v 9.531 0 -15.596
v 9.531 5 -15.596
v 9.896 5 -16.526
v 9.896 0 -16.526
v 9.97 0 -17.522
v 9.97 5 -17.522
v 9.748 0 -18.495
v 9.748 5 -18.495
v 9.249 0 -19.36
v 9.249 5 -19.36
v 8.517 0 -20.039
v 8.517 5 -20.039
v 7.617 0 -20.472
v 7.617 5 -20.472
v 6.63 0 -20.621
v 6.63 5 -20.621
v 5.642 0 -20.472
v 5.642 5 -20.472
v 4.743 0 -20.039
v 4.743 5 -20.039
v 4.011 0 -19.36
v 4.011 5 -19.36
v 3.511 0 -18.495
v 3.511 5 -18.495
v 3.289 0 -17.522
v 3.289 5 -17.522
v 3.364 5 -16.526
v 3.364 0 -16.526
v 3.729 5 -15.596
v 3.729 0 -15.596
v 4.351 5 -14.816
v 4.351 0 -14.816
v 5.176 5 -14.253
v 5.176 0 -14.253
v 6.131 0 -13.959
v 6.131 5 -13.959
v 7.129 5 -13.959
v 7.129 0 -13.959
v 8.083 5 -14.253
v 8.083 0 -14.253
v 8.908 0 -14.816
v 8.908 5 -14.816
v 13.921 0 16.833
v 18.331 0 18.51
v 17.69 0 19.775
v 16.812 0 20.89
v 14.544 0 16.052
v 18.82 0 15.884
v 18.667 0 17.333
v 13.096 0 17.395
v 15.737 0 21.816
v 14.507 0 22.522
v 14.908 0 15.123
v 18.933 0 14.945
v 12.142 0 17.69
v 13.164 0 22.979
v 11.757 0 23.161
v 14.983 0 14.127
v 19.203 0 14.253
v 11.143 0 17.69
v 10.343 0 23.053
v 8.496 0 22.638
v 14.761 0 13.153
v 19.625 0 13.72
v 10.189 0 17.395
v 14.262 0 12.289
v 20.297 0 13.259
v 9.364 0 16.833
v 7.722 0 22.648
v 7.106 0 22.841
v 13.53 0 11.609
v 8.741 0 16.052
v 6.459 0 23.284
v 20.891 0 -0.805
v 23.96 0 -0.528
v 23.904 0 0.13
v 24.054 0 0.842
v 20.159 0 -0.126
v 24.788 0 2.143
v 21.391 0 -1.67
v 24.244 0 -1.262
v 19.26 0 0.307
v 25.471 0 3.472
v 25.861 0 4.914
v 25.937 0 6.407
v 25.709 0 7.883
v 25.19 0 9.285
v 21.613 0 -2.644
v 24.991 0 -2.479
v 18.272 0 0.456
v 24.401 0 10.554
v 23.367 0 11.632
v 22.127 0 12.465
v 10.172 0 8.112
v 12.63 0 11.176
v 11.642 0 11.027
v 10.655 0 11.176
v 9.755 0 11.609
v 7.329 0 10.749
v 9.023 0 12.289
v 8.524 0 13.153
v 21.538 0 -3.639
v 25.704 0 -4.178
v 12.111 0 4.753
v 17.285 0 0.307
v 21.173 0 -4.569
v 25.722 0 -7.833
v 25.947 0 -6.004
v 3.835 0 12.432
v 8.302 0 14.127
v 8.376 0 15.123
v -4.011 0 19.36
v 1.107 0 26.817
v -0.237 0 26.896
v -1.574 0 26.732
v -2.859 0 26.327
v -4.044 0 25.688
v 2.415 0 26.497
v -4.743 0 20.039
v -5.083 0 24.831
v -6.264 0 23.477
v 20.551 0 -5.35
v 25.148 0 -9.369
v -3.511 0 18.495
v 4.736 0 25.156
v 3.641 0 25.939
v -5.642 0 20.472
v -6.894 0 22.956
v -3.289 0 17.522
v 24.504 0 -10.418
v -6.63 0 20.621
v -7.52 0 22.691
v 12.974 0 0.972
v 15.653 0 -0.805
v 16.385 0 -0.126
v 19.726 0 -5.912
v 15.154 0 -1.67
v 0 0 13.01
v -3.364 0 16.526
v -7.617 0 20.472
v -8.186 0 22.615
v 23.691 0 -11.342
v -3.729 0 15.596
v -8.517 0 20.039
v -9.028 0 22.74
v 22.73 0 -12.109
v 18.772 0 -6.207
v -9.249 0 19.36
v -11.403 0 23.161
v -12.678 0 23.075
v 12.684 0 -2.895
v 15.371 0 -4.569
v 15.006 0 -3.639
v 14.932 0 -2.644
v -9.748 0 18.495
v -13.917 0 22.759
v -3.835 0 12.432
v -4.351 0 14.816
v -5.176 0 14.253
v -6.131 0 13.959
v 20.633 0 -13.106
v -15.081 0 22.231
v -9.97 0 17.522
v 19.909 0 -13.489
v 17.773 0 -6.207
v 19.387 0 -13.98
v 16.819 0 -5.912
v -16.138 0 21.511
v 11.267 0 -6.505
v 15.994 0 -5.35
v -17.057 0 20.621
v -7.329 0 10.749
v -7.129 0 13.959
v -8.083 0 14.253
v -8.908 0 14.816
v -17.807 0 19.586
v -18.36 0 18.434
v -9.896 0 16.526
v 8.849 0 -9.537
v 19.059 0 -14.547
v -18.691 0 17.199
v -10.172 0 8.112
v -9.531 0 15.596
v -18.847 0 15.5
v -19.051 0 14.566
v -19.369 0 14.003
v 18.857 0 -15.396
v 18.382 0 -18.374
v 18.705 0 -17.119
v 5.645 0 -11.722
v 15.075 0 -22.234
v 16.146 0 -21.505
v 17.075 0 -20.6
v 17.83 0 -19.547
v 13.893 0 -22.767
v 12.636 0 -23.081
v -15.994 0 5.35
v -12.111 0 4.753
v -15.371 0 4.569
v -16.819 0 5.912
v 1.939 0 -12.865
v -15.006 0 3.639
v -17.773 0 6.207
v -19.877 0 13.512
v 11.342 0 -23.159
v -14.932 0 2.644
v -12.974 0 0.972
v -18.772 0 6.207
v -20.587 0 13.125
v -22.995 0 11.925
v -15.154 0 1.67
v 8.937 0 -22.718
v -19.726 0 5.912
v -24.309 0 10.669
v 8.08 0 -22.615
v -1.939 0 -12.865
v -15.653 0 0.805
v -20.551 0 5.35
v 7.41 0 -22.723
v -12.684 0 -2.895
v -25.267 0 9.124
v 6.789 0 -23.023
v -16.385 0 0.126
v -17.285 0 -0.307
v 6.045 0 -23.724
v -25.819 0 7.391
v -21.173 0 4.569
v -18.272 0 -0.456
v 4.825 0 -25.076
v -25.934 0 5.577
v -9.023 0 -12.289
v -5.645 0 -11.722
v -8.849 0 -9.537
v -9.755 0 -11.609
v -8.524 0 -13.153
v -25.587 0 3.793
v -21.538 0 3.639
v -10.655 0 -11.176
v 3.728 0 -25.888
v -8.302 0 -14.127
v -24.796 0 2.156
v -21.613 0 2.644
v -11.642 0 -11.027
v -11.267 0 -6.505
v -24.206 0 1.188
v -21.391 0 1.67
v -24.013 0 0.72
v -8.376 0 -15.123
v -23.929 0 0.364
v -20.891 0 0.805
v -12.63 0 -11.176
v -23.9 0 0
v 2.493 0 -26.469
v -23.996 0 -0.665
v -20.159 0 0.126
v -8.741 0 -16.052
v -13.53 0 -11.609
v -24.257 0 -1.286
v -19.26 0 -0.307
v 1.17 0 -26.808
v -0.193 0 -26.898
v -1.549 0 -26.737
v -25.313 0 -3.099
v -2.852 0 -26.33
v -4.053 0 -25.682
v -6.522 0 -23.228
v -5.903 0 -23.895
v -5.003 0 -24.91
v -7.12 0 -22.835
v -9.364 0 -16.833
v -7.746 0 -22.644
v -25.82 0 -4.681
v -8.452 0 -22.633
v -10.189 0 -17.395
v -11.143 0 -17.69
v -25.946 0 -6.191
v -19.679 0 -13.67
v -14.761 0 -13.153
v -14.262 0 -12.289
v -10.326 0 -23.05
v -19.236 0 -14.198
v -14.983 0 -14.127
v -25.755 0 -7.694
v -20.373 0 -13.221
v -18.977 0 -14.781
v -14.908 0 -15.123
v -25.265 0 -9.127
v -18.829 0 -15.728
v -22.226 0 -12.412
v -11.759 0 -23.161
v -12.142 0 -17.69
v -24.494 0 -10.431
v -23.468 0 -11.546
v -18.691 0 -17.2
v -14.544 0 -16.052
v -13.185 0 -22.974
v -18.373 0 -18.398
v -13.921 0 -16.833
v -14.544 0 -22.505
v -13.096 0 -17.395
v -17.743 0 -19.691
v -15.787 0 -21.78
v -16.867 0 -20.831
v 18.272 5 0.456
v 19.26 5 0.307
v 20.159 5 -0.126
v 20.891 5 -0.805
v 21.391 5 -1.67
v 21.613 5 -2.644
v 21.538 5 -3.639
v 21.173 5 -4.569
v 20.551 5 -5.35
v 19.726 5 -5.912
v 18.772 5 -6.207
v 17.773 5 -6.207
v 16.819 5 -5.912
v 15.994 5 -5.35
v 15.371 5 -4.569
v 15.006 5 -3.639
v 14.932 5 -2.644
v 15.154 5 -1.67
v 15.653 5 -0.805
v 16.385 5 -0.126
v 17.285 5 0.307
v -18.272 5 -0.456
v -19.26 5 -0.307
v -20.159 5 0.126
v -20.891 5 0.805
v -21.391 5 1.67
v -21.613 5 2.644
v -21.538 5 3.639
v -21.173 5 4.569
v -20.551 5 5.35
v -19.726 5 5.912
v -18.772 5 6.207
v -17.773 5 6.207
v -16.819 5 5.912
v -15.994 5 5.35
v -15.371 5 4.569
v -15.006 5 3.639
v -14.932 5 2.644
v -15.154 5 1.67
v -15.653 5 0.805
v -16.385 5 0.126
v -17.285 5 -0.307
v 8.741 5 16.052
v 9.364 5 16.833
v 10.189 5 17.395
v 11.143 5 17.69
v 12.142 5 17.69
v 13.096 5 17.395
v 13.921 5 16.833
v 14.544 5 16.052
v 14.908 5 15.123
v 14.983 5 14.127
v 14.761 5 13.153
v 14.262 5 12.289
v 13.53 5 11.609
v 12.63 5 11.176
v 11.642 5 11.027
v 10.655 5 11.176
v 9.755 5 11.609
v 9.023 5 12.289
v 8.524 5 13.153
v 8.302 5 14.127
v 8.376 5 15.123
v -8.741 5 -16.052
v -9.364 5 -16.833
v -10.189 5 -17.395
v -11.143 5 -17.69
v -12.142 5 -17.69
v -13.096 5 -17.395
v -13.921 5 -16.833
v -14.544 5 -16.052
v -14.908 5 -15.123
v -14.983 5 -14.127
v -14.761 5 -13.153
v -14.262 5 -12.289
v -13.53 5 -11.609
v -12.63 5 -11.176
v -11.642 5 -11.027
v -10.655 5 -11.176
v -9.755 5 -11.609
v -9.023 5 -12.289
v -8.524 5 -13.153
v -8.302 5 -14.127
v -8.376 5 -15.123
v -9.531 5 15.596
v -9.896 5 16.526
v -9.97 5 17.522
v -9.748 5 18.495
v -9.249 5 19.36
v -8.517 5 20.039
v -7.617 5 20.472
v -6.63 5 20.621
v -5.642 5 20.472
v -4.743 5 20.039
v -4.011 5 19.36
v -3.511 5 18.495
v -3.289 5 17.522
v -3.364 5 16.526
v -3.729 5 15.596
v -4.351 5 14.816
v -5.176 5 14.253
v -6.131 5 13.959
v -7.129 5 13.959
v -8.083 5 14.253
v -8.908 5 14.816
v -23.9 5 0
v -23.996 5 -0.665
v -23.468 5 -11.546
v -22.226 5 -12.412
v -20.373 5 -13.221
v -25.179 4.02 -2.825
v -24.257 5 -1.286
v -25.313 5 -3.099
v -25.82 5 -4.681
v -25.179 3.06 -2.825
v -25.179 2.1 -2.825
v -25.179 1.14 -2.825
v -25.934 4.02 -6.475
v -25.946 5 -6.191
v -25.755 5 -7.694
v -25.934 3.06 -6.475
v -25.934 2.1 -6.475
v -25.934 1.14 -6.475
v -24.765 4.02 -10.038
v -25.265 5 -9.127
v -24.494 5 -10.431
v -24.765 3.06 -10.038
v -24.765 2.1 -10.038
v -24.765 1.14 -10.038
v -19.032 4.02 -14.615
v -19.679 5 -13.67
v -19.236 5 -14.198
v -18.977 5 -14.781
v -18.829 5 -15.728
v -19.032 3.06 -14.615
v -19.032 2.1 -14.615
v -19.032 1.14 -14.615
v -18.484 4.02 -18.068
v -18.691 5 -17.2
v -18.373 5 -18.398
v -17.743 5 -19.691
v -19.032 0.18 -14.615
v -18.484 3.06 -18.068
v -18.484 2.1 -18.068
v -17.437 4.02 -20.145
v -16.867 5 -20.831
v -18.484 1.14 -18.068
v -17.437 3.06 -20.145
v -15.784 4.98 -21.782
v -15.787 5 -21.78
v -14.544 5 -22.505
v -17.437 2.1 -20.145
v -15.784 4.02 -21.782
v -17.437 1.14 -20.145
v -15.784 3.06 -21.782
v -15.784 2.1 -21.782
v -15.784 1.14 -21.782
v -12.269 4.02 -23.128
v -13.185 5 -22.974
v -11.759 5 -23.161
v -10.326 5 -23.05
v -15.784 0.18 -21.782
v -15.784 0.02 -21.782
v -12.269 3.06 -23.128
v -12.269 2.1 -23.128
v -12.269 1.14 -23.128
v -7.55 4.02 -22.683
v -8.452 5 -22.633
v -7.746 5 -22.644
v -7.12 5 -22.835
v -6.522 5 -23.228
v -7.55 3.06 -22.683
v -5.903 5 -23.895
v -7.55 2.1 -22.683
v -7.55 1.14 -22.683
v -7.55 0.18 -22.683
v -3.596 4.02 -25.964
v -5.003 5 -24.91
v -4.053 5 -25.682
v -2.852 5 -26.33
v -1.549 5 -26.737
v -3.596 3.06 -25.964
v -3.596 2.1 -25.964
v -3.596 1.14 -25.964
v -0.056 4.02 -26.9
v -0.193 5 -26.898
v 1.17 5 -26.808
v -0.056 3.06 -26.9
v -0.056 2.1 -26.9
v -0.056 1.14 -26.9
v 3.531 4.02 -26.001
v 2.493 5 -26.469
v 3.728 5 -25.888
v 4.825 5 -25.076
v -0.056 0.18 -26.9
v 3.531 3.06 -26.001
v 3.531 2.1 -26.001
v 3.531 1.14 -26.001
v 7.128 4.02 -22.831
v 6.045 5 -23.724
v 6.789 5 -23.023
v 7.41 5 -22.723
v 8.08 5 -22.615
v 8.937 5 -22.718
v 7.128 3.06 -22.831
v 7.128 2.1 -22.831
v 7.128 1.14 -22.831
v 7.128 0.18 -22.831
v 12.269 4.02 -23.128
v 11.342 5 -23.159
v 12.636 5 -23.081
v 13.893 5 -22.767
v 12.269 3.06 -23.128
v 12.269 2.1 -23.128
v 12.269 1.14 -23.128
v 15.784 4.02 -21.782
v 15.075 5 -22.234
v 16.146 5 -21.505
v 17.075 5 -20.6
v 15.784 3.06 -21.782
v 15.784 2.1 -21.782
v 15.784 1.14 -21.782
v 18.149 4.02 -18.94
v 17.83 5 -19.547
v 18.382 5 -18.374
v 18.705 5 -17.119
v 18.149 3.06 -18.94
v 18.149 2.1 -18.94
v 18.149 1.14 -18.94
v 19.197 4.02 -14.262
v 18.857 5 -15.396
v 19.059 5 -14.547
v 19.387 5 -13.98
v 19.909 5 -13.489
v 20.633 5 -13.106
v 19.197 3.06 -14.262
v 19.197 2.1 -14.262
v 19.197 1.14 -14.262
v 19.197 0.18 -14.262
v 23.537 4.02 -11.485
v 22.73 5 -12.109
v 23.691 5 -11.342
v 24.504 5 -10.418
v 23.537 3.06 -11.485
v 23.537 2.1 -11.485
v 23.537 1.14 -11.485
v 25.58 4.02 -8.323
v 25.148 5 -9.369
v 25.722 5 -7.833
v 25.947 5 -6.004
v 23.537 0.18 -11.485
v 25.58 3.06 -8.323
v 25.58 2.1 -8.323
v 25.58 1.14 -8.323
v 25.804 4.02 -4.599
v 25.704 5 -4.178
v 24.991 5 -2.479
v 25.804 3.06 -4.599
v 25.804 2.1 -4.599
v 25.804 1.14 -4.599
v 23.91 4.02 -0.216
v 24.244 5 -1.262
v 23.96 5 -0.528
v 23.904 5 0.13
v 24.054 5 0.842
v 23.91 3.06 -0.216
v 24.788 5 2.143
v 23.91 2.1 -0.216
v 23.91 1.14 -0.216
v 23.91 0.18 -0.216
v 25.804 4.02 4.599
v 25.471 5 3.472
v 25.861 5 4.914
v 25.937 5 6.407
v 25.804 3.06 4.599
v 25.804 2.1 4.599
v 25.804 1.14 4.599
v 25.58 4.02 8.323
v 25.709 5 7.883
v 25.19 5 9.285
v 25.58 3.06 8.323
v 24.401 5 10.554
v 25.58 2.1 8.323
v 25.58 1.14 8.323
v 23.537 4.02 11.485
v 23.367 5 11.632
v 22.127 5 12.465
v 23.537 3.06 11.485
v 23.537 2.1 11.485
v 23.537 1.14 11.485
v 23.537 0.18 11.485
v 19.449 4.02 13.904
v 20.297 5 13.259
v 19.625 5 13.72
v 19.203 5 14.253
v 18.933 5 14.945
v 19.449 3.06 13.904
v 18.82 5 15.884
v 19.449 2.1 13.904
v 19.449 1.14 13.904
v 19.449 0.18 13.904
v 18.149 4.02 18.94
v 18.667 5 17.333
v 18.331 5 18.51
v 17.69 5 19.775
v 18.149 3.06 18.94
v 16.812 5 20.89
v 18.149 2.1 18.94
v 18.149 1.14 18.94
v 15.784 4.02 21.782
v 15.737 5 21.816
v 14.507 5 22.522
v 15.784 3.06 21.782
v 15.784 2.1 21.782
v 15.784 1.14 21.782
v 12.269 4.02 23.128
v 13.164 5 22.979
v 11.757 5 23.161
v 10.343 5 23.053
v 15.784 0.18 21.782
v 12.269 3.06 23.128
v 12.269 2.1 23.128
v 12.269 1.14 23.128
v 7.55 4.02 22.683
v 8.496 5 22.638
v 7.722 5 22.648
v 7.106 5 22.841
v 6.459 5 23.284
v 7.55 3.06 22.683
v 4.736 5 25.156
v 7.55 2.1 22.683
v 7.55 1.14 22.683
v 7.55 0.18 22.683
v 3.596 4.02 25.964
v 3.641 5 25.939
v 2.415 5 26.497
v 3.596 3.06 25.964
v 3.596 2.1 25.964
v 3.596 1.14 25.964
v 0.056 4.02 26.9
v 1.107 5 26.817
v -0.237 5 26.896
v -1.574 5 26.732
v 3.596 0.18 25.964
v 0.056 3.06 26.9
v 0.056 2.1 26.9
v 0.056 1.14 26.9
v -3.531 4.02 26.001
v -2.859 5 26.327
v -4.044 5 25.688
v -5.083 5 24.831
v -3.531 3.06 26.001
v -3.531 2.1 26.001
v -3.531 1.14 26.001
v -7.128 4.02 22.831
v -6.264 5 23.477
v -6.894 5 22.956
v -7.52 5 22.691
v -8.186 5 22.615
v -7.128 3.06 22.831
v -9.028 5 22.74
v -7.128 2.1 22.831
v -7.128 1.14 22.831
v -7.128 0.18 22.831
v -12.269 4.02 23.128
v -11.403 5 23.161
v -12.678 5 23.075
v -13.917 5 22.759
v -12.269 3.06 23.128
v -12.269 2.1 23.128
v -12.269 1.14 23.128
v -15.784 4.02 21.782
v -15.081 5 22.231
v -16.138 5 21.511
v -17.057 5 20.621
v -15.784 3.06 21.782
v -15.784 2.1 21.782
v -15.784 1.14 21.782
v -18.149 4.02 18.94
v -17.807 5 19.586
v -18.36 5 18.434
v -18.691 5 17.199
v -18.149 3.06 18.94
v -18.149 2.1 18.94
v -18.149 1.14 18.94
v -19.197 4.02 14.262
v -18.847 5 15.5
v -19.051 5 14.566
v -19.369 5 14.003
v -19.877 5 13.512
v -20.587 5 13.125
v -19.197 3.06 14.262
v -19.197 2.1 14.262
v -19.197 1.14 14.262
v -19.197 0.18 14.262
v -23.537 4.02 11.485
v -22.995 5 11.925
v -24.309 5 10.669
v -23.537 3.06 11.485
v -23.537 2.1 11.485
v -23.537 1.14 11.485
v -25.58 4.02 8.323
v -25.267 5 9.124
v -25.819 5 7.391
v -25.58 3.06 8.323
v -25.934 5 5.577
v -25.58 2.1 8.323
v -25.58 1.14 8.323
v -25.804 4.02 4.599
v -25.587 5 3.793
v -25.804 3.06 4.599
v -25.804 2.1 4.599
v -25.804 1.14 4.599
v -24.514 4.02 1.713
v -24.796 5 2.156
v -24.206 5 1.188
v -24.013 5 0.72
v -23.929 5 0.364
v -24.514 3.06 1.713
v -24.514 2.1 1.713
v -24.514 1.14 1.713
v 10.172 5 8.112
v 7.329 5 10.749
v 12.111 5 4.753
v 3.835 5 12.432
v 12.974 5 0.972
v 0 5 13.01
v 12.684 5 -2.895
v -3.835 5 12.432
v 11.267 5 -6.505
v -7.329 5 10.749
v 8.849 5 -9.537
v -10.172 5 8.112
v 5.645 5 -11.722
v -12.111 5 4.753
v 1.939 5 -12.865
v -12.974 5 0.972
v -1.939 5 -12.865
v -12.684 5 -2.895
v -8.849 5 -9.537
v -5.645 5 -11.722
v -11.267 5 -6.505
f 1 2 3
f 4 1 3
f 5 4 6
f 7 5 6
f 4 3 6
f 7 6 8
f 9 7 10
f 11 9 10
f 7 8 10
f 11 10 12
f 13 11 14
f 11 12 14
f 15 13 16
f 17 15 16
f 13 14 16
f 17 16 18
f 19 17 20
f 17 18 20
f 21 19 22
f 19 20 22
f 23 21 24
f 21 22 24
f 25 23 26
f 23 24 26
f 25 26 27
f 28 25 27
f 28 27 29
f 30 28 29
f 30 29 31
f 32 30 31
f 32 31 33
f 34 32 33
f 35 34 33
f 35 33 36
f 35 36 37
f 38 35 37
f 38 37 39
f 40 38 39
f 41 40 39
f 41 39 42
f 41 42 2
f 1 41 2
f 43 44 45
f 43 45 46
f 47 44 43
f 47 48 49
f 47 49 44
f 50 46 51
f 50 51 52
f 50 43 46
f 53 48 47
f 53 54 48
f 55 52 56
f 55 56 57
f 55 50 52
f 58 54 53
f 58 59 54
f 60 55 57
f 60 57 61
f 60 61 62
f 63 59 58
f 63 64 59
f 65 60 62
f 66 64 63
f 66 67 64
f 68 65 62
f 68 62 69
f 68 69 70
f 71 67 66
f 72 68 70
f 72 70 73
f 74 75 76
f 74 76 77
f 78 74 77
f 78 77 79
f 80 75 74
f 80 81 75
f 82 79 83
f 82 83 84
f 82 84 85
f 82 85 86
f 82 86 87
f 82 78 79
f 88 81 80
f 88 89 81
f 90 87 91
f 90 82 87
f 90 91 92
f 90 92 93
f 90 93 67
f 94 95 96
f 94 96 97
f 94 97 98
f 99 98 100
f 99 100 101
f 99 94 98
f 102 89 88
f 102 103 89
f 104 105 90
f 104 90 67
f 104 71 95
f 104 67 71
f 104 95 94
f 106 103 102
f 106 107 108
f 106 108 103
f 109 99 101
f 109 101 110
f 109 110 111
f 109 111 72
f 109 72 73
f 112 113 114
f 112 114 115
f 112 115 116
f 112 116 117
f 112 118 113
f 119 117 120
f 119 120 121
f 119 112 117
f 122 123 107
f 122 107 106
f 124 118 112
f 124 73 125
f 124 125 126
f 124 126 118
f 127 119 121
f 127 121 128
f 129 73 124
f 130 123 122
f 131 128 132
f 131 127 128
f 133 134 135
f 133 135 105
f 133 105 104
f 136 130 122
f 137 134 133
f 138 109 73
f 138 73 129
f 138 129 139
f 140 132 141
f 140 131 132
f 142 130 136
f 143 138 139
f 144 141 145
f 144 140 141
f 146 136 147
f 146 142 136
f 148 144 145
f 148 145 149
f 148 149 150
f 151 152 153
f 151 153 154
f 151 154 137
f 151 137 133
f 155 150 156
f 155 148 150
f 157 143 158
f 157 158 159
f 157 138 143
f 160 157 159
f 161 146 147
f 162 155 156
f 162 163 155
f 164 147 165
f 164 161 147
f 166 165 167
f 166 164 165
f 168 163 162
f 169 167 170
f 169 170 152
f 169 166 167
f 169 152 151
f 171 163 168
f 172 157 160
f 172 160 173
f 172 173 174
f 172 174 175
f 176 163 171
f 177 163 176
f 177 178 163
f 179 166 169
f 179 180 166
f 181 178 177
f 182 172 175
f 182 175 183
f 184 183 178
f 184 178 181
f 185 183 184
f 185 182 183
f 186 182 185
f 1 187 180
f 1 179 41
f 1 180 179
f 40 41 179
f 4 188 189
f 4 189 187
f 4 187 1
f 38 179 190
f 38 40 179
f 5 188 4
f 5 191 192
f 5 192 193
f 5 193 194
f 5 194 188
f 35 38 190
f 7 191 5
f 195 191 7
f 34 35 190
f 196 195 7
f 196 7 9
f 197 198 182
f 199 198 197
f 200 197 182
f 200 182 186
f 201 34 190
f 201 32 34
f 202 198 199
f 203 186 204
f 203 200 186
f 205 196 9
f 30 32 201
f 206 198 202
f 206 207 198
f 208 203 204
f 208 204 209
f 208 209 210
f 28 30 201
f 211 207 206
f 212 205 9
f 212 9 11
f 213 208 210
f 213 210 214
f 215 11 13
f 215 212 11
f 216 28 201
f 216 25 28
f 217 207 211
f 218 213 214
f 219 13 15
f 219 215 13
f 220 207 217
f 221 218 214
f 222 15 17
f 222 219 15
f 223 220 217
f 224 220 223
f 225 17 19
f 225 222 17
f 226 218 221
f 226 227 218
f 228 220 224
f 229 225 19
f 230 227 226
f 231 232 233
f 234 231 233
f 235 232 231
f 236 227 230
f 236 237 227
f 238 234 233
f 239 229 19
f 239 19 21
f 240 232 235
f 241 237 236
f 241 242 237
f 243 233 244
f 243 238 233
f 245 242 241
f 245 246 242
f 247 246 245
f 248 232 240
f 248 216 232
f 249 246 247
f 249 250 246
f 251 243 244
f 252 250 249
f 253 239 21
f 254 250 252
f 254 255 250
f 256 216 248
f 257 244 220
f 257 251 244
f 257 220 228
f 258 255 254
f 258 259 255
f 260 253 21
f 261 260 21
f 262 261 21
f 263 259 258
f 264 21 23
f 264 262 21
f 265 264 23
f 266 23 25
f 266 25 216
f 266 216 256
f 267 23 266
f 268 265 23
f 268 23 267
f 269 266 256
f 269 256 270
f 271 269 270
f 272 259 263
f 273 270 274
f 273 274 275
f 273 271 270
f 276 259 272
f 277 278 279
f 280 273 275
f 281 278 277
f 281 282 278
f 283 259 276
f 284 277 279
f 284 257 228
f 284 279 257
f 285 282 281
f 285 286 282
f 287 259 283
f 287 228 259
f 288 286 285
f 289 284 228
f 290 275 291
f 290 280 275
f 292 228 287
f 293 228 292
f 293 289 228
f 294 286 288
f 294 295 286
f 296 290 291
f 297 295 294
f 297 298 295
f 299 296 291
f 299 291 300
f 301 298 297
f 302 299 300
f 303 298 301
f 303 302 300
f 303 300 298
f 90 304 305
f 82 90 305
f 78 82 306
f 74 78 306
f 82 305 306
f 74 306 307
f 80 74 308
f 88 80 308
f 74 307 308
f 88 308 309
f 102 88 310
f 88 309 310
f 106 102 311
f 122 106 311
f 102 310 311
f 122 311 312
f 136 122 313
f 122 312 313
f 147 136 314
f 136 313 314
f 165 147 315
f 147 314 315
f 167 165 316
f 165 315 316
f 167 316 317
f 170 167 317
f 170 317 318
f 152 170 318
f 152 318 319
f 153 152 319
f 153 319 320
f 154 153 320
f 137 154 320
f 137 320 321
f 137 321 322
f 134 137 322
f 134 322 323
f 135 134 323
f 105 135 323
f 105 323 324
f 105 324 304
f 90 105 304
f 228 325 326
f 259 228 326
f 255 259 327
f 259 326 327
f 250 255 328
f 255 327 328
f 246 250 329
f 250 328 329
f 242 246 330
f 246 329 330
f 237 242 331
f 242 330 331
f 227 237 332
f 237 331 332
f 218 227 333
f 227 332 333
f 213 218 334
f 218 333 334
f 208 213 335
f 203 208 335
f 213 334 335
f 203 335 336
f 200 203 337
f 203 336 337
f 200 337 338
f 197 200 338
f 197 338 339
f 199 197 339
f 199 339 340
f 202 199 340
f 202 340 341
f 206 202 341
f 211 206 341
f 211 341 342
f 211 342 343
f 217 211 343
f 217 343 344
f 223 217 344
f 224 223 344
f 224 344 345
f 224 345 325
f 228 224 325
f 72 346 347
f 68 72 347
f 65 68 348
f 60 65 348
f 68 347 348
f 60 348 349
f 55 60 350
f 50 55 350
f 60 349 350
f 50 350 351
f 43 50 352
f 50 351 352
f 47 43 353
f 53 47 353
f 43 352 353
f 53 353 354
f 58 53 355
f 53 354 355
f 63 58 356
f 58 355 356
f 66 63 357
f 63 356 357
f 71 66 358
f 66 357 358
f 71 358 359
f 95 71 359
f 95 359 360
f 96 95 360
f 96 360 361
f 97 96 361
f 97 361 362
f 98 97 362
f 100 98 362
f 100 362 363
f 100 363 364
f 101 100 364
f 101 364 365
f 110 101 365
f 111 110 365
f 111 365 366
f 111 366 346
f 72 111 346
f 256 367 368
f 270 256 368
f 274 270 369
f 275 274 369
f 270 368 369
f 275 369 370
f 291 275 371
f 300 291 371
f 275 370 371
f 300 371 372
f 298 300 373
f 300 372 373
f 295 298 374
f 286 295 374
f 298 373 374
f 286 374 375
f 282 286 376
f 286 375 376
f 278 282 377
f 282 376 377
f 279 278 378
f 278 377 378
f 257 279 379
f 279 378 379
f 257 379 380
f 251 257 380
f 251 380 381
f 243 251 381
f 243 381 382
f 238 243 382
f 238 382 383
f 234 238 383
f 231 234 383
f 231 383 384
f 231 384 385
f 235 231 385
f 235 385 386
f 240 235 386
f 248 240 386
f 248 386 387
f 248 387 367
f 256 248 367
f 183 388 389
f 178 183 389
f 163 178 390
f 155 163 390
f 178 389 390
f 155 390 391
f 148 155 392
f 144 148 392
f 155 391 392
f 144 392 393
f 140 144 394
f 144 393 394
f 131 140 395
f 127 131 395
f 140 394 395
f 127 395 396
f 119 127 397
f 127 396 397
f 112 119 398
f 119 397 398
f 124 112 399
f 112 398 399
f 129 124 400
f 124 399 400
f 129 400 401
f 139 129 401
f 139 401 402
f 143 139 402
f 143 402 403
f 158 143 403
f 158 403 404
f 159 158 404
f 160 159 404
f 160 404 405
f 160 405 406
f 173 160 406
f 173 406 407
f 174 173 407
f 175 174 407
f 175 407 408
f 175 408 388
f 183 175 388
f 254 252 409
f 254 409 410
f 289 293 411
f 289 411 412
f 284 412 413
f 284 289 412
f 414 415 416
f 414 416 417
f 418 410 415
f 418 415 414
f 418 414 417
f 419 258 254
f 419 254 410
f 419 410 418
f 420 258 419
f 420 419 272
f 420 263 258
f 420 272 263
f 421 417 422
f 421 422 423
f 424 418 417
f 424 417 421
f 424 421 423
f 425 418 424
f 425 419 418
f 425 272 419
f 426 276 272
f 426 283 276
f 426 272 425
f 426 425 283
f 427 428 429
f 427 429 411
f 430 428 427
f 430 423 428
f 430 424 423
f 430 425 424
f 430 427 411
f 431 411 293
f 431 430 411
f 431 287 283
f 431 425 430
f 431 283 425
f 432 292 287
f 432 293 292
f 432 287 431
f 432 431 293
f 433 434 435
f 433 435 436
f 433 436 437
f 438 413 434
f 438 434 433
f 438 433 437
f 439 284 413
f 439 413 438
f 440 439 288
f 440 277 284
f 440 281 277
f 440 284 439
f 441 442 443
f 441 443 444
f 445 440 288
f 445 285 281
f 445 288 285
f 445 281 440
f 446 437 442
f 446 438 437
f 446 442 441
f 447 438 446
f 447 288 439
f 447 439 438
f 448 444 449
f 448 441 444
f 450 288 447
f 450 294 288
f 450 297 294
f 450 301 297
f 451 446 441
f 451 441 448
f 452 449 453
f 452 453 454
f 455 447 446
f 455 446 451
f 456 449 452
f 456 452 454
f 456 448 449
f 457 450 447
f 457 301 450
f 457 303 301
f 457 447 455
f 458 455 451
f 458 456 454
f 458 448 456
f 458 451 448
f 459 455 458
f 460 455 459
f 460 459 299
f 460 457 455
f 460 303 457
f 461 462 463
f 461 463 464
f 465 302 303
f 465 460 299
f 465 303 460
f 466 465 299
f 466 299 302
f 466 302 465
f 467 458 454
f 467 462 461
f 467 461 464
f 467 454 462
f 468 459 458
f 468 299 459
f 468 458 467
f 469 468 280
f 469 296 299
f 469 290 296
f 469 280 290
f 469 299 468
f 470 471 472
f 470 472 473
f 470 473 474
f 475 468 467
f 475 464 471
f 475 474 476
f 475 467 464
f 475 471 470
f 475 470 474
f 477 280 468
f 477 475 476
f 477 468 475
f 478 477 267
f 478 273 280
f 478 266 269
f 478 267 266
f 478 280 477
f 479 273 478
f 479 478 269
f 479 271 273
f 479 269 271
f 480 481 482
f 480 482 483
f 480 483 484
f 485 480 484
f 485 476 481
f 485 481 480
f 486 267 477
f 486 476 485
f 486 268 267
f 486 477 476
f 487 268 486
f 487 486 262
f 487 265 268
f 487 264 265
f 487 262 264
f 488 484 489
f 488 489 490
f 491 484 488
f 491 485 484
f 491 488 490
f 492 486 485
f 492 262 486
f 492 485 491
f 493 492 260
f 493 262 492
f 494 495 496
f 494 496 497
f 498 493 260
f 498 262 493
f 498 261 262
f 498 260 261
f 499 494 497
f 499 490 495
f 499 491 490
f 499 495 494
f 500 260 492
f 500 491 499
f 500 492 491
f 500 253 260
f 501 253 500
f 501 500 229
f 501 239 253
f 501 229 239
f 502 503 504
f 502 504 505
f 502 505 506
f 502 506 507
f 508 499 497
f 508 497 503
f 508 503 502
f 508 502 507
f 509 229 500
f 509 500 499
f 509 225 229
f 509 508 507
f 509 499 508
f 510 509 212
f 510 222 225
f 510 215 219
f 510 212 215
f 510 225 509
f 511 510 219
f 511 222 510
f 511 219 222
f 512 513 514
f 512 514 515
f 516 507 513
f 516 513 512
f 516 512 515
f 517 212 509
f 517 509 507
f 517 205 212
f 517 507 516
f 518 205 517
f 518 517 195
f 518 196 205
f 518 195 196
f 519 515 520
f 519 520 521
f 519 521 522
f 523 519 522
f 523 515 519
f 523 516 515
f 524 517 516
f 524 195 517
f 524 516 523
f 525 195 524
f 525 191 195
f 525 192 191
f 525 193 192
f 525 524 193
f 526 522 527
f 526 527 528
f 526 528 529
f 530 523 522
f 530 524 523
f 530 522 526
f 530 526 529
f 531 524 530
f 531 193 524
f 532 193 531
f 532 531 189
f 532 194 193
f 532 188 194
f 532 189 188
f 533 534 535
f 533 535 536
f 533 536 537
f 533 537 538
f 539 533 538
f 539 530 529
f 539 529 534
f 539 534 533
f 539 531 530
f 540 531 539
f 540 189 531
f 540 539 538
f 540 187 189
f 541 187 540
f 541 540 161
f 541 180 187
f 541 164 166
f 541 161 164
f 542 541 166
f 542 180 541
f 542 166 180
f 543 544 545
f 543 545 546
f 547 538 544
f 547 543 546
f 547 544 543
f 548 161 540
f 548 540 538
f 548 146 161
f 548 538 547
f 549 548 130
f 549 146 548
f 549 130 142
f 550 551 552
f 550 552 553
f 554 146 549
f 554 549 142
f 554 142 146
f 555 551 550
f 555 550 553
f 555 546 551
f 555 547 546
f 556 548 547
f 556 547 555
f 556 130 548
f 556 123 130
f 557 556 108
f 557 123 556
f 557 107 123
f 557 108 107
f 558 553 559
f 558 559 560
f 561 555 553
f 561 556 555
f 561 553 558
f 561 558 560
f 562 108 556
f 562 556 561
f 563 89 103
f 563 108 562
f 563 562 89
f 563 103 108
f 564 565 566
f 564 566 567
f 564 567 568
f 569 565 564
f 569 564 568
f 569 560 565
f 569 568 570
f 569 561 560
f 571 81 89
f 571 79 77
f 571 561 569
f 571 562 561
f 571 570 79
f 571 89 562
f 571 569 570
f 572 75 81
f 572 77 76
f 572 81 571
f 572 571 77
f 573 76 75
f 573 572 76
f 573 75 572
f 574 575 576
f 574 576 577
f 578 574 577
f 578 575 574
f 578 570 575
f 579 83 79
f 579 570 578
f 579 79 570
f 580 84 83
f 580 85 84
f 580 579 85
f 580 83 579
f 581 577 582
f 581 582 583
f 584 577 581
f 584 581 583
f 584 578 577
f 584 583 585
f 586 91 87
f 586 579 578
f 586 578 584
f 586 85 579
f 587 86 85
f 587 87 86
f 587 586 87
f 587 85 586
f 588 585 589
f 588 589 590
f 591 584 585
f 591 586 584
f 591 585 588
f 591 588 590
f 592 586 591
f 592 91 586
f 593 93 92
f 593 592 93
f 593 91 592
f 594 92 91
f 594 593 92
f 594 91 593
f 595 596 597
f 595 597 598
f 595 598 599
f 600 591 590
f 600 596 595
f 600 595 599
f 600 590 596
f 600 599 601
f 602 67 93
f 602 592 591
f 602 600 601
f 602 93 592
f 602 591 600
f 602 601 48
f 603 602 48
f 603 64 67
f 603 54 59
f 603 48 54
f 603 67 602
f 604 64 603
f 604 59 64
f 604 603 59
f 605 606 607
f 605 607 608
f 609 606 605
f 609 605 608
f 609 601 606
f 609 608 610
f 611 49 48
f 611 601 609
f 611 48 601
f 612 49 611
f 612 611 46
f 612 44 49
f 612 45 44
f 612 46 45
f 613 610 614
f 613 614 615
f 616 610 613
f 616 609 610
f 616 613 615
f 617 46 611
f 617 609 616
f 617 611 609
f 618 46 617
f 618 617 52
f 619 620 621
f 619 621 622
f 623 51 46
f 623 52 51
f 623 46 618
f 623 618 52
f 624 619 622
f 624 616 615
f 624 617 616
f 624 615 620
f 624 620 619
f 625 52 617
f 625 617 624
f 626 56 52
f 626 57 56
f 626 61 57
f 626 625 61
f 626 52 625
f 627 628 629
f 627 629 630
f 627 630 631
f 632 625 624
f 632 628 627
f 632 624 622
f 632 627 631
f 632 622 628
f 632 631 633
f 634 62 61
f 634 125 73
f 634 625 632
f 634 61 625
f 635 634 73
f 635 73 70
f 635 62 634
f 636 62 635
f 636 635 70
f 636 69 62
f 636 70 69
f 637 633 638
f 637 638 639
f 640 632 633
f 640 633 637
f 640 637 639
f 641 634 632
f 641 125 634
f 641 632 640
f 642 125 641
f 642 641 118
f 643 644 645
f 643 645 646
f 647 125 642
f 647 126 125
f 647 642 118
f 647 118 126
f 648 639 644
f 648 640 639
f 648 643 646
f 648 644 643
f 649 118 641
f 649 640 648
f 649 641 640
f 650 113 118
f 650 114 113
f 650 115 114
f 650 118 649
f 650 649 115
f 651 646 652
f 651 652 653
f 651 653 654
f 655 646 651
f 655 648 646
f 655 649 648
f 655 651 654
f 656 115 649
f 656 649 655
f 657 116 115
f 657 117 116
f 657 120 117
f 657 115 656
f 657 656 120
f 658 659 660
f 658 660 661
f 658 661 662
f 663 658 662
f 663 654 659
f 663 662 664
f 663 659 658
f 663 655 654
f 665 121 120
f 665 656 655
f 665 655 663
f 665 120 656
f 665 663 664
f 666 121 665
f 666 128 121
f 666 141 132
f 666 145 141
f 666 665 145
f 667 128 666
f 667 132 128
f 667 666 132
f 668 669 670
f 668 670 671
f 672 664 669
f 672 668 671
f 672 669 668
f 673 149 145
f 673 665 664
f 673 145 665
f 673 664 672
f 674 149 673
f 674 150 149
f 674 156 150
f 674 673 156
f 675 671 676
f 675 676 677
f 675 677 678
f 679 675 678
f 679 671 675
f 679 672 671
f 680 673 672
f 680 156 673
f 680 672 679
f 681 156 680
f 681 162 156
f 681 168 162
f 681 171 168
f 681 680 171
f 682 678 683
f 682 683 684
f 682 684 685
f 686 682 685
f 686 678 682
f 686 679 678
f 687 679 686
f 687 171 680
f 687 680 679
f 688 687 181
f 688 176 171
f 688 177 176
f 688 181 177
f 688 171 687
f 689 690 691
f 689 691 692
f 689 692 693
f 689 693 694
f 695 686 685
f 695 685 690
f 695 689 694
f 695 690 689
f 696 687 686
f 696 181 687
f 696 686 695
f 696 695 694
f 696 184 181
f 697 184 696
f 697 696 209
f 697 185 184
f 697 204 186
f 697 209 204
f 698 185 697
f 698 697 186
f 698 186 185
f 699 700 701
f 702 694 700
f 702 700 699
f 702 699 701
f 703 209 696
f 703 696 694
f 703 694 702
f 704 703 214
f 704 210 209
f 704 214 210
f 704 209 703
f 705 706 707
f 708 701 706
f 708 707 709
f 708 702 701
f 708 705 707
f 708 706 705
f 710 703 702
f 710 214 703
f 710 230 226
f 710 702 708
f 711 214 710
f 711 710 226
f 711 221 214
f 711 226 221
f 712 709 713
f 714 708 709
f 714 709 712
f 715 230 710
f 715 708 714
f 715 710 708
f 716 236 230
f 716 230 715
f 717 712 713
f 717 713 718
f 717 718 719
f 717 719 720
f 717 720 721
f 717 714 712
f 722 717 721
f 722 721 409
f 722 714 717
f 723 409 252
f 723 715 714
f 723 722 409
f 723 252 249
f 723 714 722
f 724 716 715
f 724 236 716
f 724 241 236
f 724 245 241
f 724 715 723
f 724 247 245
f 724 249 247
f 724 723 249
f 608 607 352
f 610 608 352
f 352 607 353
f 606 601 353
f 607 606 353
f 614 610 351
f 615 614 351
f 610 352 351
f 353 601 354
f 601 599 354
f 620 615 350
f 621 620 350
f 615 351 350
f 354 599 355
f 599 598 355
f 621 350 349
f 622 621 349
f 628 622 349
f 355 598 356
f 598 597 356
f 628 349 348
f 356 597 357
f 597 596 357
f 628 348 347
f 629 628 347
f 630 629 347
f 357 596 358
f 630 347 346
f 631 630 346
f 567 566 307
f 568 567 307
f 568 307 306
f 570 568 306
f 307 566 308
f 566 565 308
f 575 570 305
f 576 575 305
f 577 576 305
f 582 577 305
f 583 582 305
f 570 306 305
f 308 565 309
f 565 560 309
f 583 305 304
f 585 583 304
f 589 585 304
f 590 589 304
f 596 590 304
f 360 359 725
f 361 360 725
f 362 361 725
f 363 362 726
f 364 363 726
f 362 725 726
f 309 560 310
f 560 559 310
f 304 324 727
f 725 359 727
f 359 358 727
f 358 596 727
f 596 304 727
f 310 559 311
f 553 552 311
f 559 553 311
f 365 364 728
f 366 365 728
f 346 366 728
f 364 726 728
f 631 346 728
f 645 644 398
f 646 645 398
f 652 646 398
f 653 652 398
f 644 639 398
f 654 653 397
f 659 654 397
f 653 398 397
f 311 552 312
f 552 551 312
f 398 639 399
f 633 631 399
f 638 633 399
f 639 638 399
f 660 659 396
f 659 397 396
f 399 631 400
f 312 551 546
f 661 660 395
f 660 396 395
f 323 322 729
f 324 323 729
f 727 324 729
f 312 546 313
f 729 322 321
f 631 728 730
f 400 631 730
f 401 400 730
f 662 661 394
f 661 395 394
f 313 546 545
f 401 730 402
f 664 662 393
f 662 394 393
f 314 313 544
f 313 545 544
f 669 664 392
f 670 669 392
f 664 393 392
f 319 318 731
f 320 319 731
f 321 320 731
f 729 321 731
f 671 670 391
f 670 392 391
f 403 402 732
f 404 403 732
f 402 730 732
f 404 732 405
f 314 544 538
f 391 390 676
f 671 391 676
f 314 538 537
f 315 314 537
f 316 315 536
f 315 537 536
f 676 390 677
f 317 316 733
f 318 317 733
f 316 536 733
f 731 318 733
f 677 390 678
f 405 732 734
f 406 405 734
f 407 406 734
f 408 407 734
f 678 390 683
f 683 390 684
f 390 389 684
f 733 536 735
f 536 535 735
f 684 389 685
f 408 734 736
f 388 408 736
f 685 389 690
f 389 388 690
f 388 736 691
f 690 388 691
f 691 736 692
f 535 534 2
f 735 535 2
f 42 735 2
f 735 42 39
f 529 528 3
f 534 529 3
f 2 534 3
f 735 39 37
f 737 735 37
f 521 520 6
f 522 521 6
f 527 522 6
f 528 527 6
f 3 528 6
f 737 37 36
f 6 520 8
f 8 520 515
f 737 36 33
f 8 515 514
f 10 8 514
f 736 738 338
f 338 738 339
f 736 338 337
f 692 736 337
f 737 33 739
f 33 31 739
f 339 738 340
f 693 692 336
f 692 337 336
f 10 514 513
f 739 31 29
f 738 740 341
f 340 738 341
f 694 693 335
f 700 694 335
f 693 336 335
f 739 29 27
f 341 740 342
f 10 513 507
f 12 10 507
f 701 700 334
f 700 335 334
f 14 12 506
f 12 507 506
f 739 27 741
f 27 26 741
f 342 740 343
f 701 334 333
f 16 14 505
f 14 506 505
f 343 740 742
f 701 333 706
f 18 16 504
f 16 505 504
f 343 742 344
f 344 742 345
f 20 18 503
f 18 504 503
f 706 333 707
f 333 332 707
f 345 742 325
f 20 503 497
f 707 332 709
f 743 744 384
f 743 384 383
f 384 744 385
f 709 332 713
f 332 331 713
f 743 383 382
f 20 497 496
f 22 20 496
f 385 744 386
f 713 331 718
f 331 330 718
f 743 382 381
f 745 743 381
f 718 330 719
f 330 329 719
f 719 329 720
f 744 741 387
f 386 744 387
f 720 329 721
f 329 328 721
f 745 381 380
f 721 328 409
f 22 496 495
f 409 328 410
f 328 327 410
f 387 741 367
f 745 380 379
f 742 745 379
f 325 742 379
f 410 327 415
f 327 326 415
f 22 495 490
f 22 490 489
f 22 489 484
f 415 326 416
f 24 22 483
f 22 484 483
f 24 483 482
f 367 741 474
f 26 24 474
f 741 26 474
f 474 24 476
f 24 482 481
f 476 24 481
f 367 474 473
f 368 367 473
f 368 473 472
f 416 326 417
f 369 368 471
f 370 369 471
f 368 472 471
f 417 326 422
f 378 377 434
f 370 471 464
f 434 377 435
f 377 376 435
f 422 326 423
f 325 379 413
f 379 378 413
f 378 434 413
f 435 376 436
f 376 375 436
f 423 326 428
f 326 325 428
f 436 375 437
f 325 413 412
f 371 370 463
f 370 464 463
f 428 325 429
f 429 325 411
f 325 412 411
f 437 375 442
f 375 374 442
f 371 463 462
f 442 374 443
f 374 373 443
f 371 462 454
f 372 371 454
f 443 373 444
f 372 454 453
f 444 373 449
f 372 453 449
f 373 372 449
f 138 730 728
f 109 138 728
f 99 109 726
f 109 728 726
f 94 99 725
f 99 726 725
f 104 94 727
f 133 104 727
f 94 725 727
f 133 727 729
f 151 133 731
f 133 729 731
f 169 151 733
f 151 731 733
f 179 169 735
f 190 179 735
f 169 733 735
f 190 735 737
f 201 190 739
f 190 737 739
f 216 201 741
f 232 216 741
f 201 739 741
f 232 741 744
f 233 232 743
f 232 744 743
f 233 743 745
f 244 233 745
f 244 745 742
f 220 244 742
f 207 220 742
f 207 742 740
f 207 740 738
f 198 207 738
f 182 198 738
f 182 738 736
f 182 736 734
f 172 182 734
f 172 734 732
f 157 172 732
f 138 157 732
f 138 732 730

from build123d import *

# Parameters (mm, degrees)
BOSS_EXTRUDE1_DEPTH = 5
SKETCH2_R           = 13.01
CUT_EXTRUDE1_DEPTH  = 38.707841393
SKETCH3_R           = 3.35
CUT_EXTRUDE2_DEPTH  = 38.707841393
CIRPATTERN1_COUNT   = 6


with BuildPart() as part:
    # Sketch1 → Boss-Extrude1 (new body)
    with BuildSketch(Plane(origin=(0, 0, 0), x_dir=(1, 0, 0), z_dir=(0, 1, 0))):
        with BuildLine():
            add(Edge.make_bspline(
                [(23.9, 0), (23.9, -0.016633989), (23.900445322, -0.049716738), (23.903117263, -0.135350435), (23.912449323, -0.258275625), (23.931014764, -0.389664583), (23.95950077, -0.532178366), (23.991965599, -0.654750336), (24.032983907, -0.786511172), (24.083782664, -0.924885773), (24.152134694, -1.082987887), (24.242890991, -1.262939392), (24.344653165, -1.442540166), (24.455160863, -1.62253731), (24.571701309, -1.804480724), (24.718332668, -2.031272436), (24.891440754, -2.305276667), (25.08752709, -2.640233385), (25.293354955, -3.042827983), (25.523356461, -3.575365943), (25.743503693, -4.249070037), (25.90895307, -5.060229623), (25.989021701, -6.239979202), (25.864263399, -7.422194916), (25.541810184, -8.56833506), (25.032271071, -9.642344828), (24.515868766, -10.44509368), (23.898825197, -11.173556713), (23.189250761, -11.812425557), (22.506894507, -12.273540648), (21.894123423, -12.592734858), (21.380382876, -12.81286495), (20.981186658, -12.967022062), (20.508286762, -13.149650453), (20.002819314, -13.392358805), (19.516275612, -13.770444983), (19.107135549, -14.342924661), (18.904436986, -14.938672604), (18.837743288, -15.510825887), (18.811680981, -16.040809437), (18.784521574, -16.489892991), (18.724656278, -17.057834998), (18.596613672, -17.739277292), (18.286978104, -18.742891592), (17.634453661, -19.994985608), (16.567681951, -21.268872628), (15.018746131, -22.380373674), (13.232021309, -23.071186796), (11.686263401, -23.233504295), (10.520948657, -23.10721323), (9.745023474, -22.927131672), (9.331355803, -22.817516456), (8.8414507, -22.687628022), (8.289082778, -22.590399027), (7.675024184, -22.615604046), (7.013991426, -22.842464767), (6.507806015, -23.203624322), (6.123760777, -23.620439494), (5.797319915, -24.026122754), (5.516993379, -24.366413103), (4.988653796, -24.957955887), (4.121749015, -25.716255592), (2.800220177, -26.458949577), (0.986584089, -26.932274503), (-0.892508871, -26.944576885), (-2.492684707, -26.549040992), (-3.758629608, -25.923530552), (-4.601197212, -25.296224361), (-5.106881385, -24.821721344), (-5.490331154, -24.398391643), (-5.776848315, -24.051429867), (-6.109234539, -23.637738359), (-6.497134166, -23.211951019), (-7.00800434, -22.844726368), (-7.673409625, -22.615662906), (-8.289091303, -22.590403621), (-8.841445105, -22.687625059), (-9.331358863, -22.817518065), (-9.745022337, -22.927131075), (-10.520949385, -23.107213612), (-11.686262901, -23.233504033), (-13.232021627, -23.071186963), (-15.018745949, -22.380373578), (-16.567682076, -21.268872694), (-17.63445358, -19.994985565), (-18.286978155, -18.742891619), (-18.596613642, -17.739277276), (-18.724656297, -17.057835008), (-18.784521564, -16.489892985), (-18.811680987, -16.04080944), (-18.837743285, -15.510825885), (-18.904436988, -14.938672605), (-19.107135548, -14.34292466), (-19.516275613, -13.770444984), (-20.002819314, -13.392358805), (-20.508286763, -13.149650453), (-20.981186657, -12.967022061), (-21.380382877, -12.81286495), (-21.894123423, -12.592734858), (-22.506894507, -12.273540648), (-23.189250761, -11.812425557), (-23.898825197, -11.173556713), (-24.515868766, -10.44509368), (-25.032271071, -9.642344828), (-25.541810184, -8.56833506), (-25.864263399, -7.422194916), (-25.989021701, -6.239979202), (-25.90895307, -5.060229623), (-25.743503693, -4.249070037), (-25.523356461, -3.575365943), (-25.293354955, -3.042827983), (-25.08752709, -2.640233385), (-24.891440754, -2.305276667), (-24.718332668, -2.031272436), (-24.571701309, -1.804480724), (-24.455160863, -1.62253731), (-24.344653165, -1.442540166), (-24.242890991, -1.262939392), (-24.152134694, -1.082987887), (-24.083782664, -0.924885773), (-24.032983907, -0.786511172), (-23.991965599, -0.654750336), (-23.95950077, -0.532178365), (-23.931014765, -0.389664584), (-23.912449321, -0.258275624), (-23.903117265, -0.135350437), (-23.900445324, -0.049716739), (-23.9, -0.016633989), (-23.9, 0)],
                knots=[0.076870089, 0.076870089, 0.076870089, 0.076870089, 0.076870089, 0.077626864, 0.078383639, 0.079897189, 0.081410739, 0.082924289, 0.083870594, 0.084816898, 0.086709508, 0.088602118, 0.090494728, 0.092574338, 0.094653949, 0.096733559, 0.09881317, 0.102972391, 0.107131612, 0.111670975, 0.116210339, 0.125289066, 0.134368095, 0.143447123, 0.161604528, 0.17076612, 0.179927712, 0.189089676, 0.19825164, 0.207413052, 0.216574463, 0.220692039, 0.224809615, 0.228927191, 0.233044767, 0.240218222, 0.246328137, 0.252327936, 0.259784753, 0.264113126, 0.268441498, 0.27276987, 0.277098243, 0.286093979, 0.295089716, 0.313081822, 0.331073403, 0.349394218, 0.367715837, 0.386036254, 0.390153136, 0.394270018, 0.398386899, 0.402503781, 0.4096773, 0.415786121, 0.421726112, 0.429062853, 0.433304136, 0.43754542, 0.441786703, 0.446027986, 0.463837747, 0.481648122, 0.499457726, 0.517451628, 0.535445968, 0.544442792, 0.553439616, 0.557768563, 0.562097511, 0.566426458, 0.570755406, 0.578212988, 0.584213879, 0.5903227, 0.597496219, 0.601613101, 0.605729982, 0.609846864, 0.613963746, 0.632284163, 0.650605782, 0.668926597, 0.686918178, 0.704910284, 0.713906021, 0.722901757, 0.72723013, 0.731558502, 0.735886874, 0.740215247, 0.747672064, 0.753671863, 0.759781778, 0.766955233, 0.771072809, 0.775190385, 0.779307961, 0.783425537, 0.792586948, 0.80174836, 0.810910324, 0.820072288, 0.82923388, 0.838395472, 0.856552877, 0.865631905, 0.874710934, 0.883789661, 0.888329025, 0.892868388, 0.897027609, 0.90118683, 0.903266441, 0.905346051, 0.907425662, 0.909505272, 0.911397882, 0.913290492, 0.915183102, 0.916129406, 0.917075711, 0.918589261, 0.920102811, 0.921616361, 0.922373136, 0.923129911, 0.923129911, 0.923129911, 0.923129911, 0.923129911], degree=4))
            add(Edge.make_bspline(
                [(-23.9, 0), (-23.9, 0.016633989), (-23.900445322, 0.049716738), (-23.903117263, 0.135350435), (-23.912449323, 0.258275625), (-23.931014764, 0.389664583), (-23.95950077, 0.532178365), (-23.991965599, 0.654750336), (-24.032983907, 0.786511172), (-24.083782664, 0.924885773), (-24.152134694, 1.082987887), (-24.242890991, 1.262939392), (-24.344653165, 1.442540166), (-24.455160863, 1.62253731), (-24.571701309, 1.804480724), (-24.718332668, 2.031272436), (-24.891440754, 2.305276667), (-25.08752709, 2.640233385), (-25.293354955, 3.042827983), (-25.523356461, 3.575365943), (-25.743503693, 4.249070037), (-25.90895307, 5.060229623), (-25.989021701, 6.239979202), (-25.864263399, 7.422194916), (-25.541810184, 8.56833506), (-25.032271071, 9.642344828), (-24.515868766, 10.44509368), (-23.898825197, 11.173556713), (-23.189250761, 11.812425557), (-22.506894507, 12.273540648), (-21.894123423, 12.592734858), (-21.380382876, 12.81286495), (-20.981186658, 12.967022062), (-20.508286762, 13.149650453), (-20.002819314, 13.392358805), (-19.516275612, 13.770444983), (-19.107135549, 14.342924661), (-18.904436986, 14.938672604), (-18.837743288, 15.510825887), (-18.811680981, 16.040809437), (-18.784521574, 16.489892991), (-18.724656278, 17.057834998), (-18.596613672, 17.739277292), (-18.286978104, 18.742891592), (-17.634453661, 19.994985608), (-16.567681951, 21.268872628), (-15.018746131, 22.380373674), (-13.232021309, 23.071186796), (-11.686263401, 23.233504295), (-10.520948657, 23.10721323), (-9.745023474, 22.927131672), (-9.331355803, 22.817516456), (-8.8414507, 22.687628022), (-8.289082778, 22.590399027), (-7.675024184, 22.615604046), (-7.013991426, 22.842464767), (-6.507806015, 23.203624322), (-6.123760777, 23.620439494), (-5.797319915, 24.026122754), (-5.516993379, 24.366413103), (-4.988653796, 24.957955887), (-4.121749015, 25.716255592), (-2.800220177, 26.458949577), (-0.986584089, 26.932274503), (0.892508871, 26.944576885), (2.492684707, 26.549040992), (3.758629608, 25.923530552), (4.601197212, 25.296224361), (5.106881385, 24.821721344), (5.490331154, 24.398391643), (5.776848315, 24.051429867), (6.109234539, 23.637738359), (6.497134166, 23.211951019), (7.00800434, 22.844726368), (7.673409625, 22.615662906), (8.289091303, 22.590403621), (8.841445105, 22.687625059), (9.331358863, 22.817518065), (9.745022337, 22.927131075), (10.520949385, 23.107213612), (11.686262901, 23.233504033), (13.232021627, 23.071186963), (15.018745949, 22.380373578), (16.567682076, 21.268872694), (17.63445358, 19.994985565), (18.286978155, 18.742891619), (18.596613642, 17.739277276), (18.724656297, 17.057835008), (18.784521564, 16.489892985), (18.811680987, 16.04080944), (18.837743285, 15.510825885), (18.904436988, 14.938672605), (19.107135548, 14.34292466), (19.516275613, 13.770444984), (20.002819314, 13.392358805), (20.508286763, 13.149650453), (20.981186657, 12.967022061), (21.380382877, 12.81286495), (21.894123423, 12.592734858), (22.506894507, 12.273540648), (23.189250761, 11.812425557), (23.898825197, 11.173556713), (24.515868766, 10.44509368), (25.032271071, 9.642344828), (25.541810184, 8.56833506), (25.864263399, 7.422194915), (25.989021701, 6.239979203), (25.90895307, 5.060229621), (25.743503693, 4.249070041), (25.523356461, 3.575365937), (25.293354955, 3.042827994), (25.08752709, 2.640233361), (24.891440754, 2.30527671), (24.718332668, 2.031272365), (24.571701309, 1.804480847), (24.455160863, 1.622537048), (24.344653165, 1.442540618), (24.242890991, 1.262938646), (24.152134694, 1.08298926), (24.083782664, 0.92488324), (24.032983907, 0.786515802), (23.991965599, 0.654738614), (23.95950077, 0.53221509), (23.931014764, 0.389575382), (23.912449323, 0.258442601), (23.903117262, 0.135032083), (23.900445327, 0.050068621), (23.9, 0.01663399), (23.9, 0)],
                knots=[0.076870089, 0.076870089, 0.076870089, 0.076870089, 0.076870089, 0.077626864, 0.078383639, 0.079897189, 0.081410739, 0.082924289, 0.083870594, 0.084816898, 0.086709508, 0.088602118, 0.090494728, 0.092574338, 0.094653949, 0.096733559, 0.09881317, 0.102972391, 0.107131612, 0.111670975, 0.116210339, 0.125289066, 0.134368095, 0.143447123, 0.161604528, 0.17076612, 0.179927712, 0.189089676, 0.19825164, 0.207413052, 0.216574463, 0.220692039, 0.224809615, 0.228927191, 0.233044767, 0.240218222, 0.246328137, 0.252327936, 0.259784753, 0.264113126, 0.268441498, 0.27276987, 0.277098243, 0.286093979, 0.295089716, 0.313081822, 0.331073403, 0.349394218, 0.367715837, 0.386036254, 0.390153136, 0.394270018, 0.398386899, 0.402503781, 0.4096773, 0.415786121, 0.421726112, 0.429062853, 0.433304136, 0.43754542, 0.441786703, 0.446027986, 0.463837747, 0.481648122, 0.499457726, 0.517451628, 0.535445968, 0.544442792, 0.553439616, 0.557768563, 0.562097511, 0.566426458, 0.570755406, 0.578212988, 0.584213879, 0.5903227, 0.597496219, 0.601613101, 0.605729982, 0.609846864, 0.613963746, 0.632284163, 0.650605782, 0.668926597, 0.686918178, 0.704910284, 0.713906021, 0.722901757, 0.72723013, 0.731558502, 0.735886874, 0.740215247, 0.747672064, 0.753671863, 0.759781778, 0.766955233, 0.771072809, 0.775190385, 0.779307961, 0.783425537, 0.792586948, 0.80174836, 0.810910324, 0.820072288, 0.82923388, 0.838395472, 0.856552877, 0.865631905, 0.874710934, 0.883789661, 0.888329025, 0.892868388, 0.897027609, 0.90118683, 0.903266441, 0.905346051, 0.907425662, 0.909505272, 0.911397882, 0.913290492, 0.915183102, 0.916129406, 0.917075711, 0.918589261, 0.920102811, 0.921616361, 0.922373136, 0.923129911, 0.923129911, 0.923129911, 0.923129911, 0.923129911], degree=4))
        make_face()
    extrude(amount=BOSS_EXTRUDE1_DEPTH)

    # Sketch2 → Cut-Extrude1 (cut, through all)
    with BuildSketch(Plane(origin=(0, 5, 0), x_dir=(1, 0, 0), z_dir=(0, 1, 0))):
        with Locations(Location((0, 0, 0), (0, 0, 270))):
            Circle(SKETCH2_R)
    extrude(amount=-CUT_EXTRUDE1_DEPTH, mode=Mode.SUBTRACT)

    # Sketch3 → Cut-Extrude2 (cut, through all)
    with BuildSketch(Plane(origin=(0, 5, 0), x_dir=(1, 0, 0), z_dir=(0, 1, 0))):
        with Locations(Location((18.272234301, 2.894037603, 0), (0, 0, 270))):
            Circle(SKETCH3_R)
    cut_extrude2 = extrude(amount=-CUT_EXTRUDE2_DEPTH, mode=Mode.SUBTRACT)

    # CirPattern1: Cut-Extrude2 ×6 about axis
    cirpattern1_axis = Axis((0, 0, 0), (0, 1, 0))
    for i in range(1, CIRPATTERN1_COUNT):
        add(cut_extrude2.rotate(cirpattern1_axis, i * 360 / CIRPATTERN1_COUNT), mode=Mode.SUBTRACT)


solid = part.part
